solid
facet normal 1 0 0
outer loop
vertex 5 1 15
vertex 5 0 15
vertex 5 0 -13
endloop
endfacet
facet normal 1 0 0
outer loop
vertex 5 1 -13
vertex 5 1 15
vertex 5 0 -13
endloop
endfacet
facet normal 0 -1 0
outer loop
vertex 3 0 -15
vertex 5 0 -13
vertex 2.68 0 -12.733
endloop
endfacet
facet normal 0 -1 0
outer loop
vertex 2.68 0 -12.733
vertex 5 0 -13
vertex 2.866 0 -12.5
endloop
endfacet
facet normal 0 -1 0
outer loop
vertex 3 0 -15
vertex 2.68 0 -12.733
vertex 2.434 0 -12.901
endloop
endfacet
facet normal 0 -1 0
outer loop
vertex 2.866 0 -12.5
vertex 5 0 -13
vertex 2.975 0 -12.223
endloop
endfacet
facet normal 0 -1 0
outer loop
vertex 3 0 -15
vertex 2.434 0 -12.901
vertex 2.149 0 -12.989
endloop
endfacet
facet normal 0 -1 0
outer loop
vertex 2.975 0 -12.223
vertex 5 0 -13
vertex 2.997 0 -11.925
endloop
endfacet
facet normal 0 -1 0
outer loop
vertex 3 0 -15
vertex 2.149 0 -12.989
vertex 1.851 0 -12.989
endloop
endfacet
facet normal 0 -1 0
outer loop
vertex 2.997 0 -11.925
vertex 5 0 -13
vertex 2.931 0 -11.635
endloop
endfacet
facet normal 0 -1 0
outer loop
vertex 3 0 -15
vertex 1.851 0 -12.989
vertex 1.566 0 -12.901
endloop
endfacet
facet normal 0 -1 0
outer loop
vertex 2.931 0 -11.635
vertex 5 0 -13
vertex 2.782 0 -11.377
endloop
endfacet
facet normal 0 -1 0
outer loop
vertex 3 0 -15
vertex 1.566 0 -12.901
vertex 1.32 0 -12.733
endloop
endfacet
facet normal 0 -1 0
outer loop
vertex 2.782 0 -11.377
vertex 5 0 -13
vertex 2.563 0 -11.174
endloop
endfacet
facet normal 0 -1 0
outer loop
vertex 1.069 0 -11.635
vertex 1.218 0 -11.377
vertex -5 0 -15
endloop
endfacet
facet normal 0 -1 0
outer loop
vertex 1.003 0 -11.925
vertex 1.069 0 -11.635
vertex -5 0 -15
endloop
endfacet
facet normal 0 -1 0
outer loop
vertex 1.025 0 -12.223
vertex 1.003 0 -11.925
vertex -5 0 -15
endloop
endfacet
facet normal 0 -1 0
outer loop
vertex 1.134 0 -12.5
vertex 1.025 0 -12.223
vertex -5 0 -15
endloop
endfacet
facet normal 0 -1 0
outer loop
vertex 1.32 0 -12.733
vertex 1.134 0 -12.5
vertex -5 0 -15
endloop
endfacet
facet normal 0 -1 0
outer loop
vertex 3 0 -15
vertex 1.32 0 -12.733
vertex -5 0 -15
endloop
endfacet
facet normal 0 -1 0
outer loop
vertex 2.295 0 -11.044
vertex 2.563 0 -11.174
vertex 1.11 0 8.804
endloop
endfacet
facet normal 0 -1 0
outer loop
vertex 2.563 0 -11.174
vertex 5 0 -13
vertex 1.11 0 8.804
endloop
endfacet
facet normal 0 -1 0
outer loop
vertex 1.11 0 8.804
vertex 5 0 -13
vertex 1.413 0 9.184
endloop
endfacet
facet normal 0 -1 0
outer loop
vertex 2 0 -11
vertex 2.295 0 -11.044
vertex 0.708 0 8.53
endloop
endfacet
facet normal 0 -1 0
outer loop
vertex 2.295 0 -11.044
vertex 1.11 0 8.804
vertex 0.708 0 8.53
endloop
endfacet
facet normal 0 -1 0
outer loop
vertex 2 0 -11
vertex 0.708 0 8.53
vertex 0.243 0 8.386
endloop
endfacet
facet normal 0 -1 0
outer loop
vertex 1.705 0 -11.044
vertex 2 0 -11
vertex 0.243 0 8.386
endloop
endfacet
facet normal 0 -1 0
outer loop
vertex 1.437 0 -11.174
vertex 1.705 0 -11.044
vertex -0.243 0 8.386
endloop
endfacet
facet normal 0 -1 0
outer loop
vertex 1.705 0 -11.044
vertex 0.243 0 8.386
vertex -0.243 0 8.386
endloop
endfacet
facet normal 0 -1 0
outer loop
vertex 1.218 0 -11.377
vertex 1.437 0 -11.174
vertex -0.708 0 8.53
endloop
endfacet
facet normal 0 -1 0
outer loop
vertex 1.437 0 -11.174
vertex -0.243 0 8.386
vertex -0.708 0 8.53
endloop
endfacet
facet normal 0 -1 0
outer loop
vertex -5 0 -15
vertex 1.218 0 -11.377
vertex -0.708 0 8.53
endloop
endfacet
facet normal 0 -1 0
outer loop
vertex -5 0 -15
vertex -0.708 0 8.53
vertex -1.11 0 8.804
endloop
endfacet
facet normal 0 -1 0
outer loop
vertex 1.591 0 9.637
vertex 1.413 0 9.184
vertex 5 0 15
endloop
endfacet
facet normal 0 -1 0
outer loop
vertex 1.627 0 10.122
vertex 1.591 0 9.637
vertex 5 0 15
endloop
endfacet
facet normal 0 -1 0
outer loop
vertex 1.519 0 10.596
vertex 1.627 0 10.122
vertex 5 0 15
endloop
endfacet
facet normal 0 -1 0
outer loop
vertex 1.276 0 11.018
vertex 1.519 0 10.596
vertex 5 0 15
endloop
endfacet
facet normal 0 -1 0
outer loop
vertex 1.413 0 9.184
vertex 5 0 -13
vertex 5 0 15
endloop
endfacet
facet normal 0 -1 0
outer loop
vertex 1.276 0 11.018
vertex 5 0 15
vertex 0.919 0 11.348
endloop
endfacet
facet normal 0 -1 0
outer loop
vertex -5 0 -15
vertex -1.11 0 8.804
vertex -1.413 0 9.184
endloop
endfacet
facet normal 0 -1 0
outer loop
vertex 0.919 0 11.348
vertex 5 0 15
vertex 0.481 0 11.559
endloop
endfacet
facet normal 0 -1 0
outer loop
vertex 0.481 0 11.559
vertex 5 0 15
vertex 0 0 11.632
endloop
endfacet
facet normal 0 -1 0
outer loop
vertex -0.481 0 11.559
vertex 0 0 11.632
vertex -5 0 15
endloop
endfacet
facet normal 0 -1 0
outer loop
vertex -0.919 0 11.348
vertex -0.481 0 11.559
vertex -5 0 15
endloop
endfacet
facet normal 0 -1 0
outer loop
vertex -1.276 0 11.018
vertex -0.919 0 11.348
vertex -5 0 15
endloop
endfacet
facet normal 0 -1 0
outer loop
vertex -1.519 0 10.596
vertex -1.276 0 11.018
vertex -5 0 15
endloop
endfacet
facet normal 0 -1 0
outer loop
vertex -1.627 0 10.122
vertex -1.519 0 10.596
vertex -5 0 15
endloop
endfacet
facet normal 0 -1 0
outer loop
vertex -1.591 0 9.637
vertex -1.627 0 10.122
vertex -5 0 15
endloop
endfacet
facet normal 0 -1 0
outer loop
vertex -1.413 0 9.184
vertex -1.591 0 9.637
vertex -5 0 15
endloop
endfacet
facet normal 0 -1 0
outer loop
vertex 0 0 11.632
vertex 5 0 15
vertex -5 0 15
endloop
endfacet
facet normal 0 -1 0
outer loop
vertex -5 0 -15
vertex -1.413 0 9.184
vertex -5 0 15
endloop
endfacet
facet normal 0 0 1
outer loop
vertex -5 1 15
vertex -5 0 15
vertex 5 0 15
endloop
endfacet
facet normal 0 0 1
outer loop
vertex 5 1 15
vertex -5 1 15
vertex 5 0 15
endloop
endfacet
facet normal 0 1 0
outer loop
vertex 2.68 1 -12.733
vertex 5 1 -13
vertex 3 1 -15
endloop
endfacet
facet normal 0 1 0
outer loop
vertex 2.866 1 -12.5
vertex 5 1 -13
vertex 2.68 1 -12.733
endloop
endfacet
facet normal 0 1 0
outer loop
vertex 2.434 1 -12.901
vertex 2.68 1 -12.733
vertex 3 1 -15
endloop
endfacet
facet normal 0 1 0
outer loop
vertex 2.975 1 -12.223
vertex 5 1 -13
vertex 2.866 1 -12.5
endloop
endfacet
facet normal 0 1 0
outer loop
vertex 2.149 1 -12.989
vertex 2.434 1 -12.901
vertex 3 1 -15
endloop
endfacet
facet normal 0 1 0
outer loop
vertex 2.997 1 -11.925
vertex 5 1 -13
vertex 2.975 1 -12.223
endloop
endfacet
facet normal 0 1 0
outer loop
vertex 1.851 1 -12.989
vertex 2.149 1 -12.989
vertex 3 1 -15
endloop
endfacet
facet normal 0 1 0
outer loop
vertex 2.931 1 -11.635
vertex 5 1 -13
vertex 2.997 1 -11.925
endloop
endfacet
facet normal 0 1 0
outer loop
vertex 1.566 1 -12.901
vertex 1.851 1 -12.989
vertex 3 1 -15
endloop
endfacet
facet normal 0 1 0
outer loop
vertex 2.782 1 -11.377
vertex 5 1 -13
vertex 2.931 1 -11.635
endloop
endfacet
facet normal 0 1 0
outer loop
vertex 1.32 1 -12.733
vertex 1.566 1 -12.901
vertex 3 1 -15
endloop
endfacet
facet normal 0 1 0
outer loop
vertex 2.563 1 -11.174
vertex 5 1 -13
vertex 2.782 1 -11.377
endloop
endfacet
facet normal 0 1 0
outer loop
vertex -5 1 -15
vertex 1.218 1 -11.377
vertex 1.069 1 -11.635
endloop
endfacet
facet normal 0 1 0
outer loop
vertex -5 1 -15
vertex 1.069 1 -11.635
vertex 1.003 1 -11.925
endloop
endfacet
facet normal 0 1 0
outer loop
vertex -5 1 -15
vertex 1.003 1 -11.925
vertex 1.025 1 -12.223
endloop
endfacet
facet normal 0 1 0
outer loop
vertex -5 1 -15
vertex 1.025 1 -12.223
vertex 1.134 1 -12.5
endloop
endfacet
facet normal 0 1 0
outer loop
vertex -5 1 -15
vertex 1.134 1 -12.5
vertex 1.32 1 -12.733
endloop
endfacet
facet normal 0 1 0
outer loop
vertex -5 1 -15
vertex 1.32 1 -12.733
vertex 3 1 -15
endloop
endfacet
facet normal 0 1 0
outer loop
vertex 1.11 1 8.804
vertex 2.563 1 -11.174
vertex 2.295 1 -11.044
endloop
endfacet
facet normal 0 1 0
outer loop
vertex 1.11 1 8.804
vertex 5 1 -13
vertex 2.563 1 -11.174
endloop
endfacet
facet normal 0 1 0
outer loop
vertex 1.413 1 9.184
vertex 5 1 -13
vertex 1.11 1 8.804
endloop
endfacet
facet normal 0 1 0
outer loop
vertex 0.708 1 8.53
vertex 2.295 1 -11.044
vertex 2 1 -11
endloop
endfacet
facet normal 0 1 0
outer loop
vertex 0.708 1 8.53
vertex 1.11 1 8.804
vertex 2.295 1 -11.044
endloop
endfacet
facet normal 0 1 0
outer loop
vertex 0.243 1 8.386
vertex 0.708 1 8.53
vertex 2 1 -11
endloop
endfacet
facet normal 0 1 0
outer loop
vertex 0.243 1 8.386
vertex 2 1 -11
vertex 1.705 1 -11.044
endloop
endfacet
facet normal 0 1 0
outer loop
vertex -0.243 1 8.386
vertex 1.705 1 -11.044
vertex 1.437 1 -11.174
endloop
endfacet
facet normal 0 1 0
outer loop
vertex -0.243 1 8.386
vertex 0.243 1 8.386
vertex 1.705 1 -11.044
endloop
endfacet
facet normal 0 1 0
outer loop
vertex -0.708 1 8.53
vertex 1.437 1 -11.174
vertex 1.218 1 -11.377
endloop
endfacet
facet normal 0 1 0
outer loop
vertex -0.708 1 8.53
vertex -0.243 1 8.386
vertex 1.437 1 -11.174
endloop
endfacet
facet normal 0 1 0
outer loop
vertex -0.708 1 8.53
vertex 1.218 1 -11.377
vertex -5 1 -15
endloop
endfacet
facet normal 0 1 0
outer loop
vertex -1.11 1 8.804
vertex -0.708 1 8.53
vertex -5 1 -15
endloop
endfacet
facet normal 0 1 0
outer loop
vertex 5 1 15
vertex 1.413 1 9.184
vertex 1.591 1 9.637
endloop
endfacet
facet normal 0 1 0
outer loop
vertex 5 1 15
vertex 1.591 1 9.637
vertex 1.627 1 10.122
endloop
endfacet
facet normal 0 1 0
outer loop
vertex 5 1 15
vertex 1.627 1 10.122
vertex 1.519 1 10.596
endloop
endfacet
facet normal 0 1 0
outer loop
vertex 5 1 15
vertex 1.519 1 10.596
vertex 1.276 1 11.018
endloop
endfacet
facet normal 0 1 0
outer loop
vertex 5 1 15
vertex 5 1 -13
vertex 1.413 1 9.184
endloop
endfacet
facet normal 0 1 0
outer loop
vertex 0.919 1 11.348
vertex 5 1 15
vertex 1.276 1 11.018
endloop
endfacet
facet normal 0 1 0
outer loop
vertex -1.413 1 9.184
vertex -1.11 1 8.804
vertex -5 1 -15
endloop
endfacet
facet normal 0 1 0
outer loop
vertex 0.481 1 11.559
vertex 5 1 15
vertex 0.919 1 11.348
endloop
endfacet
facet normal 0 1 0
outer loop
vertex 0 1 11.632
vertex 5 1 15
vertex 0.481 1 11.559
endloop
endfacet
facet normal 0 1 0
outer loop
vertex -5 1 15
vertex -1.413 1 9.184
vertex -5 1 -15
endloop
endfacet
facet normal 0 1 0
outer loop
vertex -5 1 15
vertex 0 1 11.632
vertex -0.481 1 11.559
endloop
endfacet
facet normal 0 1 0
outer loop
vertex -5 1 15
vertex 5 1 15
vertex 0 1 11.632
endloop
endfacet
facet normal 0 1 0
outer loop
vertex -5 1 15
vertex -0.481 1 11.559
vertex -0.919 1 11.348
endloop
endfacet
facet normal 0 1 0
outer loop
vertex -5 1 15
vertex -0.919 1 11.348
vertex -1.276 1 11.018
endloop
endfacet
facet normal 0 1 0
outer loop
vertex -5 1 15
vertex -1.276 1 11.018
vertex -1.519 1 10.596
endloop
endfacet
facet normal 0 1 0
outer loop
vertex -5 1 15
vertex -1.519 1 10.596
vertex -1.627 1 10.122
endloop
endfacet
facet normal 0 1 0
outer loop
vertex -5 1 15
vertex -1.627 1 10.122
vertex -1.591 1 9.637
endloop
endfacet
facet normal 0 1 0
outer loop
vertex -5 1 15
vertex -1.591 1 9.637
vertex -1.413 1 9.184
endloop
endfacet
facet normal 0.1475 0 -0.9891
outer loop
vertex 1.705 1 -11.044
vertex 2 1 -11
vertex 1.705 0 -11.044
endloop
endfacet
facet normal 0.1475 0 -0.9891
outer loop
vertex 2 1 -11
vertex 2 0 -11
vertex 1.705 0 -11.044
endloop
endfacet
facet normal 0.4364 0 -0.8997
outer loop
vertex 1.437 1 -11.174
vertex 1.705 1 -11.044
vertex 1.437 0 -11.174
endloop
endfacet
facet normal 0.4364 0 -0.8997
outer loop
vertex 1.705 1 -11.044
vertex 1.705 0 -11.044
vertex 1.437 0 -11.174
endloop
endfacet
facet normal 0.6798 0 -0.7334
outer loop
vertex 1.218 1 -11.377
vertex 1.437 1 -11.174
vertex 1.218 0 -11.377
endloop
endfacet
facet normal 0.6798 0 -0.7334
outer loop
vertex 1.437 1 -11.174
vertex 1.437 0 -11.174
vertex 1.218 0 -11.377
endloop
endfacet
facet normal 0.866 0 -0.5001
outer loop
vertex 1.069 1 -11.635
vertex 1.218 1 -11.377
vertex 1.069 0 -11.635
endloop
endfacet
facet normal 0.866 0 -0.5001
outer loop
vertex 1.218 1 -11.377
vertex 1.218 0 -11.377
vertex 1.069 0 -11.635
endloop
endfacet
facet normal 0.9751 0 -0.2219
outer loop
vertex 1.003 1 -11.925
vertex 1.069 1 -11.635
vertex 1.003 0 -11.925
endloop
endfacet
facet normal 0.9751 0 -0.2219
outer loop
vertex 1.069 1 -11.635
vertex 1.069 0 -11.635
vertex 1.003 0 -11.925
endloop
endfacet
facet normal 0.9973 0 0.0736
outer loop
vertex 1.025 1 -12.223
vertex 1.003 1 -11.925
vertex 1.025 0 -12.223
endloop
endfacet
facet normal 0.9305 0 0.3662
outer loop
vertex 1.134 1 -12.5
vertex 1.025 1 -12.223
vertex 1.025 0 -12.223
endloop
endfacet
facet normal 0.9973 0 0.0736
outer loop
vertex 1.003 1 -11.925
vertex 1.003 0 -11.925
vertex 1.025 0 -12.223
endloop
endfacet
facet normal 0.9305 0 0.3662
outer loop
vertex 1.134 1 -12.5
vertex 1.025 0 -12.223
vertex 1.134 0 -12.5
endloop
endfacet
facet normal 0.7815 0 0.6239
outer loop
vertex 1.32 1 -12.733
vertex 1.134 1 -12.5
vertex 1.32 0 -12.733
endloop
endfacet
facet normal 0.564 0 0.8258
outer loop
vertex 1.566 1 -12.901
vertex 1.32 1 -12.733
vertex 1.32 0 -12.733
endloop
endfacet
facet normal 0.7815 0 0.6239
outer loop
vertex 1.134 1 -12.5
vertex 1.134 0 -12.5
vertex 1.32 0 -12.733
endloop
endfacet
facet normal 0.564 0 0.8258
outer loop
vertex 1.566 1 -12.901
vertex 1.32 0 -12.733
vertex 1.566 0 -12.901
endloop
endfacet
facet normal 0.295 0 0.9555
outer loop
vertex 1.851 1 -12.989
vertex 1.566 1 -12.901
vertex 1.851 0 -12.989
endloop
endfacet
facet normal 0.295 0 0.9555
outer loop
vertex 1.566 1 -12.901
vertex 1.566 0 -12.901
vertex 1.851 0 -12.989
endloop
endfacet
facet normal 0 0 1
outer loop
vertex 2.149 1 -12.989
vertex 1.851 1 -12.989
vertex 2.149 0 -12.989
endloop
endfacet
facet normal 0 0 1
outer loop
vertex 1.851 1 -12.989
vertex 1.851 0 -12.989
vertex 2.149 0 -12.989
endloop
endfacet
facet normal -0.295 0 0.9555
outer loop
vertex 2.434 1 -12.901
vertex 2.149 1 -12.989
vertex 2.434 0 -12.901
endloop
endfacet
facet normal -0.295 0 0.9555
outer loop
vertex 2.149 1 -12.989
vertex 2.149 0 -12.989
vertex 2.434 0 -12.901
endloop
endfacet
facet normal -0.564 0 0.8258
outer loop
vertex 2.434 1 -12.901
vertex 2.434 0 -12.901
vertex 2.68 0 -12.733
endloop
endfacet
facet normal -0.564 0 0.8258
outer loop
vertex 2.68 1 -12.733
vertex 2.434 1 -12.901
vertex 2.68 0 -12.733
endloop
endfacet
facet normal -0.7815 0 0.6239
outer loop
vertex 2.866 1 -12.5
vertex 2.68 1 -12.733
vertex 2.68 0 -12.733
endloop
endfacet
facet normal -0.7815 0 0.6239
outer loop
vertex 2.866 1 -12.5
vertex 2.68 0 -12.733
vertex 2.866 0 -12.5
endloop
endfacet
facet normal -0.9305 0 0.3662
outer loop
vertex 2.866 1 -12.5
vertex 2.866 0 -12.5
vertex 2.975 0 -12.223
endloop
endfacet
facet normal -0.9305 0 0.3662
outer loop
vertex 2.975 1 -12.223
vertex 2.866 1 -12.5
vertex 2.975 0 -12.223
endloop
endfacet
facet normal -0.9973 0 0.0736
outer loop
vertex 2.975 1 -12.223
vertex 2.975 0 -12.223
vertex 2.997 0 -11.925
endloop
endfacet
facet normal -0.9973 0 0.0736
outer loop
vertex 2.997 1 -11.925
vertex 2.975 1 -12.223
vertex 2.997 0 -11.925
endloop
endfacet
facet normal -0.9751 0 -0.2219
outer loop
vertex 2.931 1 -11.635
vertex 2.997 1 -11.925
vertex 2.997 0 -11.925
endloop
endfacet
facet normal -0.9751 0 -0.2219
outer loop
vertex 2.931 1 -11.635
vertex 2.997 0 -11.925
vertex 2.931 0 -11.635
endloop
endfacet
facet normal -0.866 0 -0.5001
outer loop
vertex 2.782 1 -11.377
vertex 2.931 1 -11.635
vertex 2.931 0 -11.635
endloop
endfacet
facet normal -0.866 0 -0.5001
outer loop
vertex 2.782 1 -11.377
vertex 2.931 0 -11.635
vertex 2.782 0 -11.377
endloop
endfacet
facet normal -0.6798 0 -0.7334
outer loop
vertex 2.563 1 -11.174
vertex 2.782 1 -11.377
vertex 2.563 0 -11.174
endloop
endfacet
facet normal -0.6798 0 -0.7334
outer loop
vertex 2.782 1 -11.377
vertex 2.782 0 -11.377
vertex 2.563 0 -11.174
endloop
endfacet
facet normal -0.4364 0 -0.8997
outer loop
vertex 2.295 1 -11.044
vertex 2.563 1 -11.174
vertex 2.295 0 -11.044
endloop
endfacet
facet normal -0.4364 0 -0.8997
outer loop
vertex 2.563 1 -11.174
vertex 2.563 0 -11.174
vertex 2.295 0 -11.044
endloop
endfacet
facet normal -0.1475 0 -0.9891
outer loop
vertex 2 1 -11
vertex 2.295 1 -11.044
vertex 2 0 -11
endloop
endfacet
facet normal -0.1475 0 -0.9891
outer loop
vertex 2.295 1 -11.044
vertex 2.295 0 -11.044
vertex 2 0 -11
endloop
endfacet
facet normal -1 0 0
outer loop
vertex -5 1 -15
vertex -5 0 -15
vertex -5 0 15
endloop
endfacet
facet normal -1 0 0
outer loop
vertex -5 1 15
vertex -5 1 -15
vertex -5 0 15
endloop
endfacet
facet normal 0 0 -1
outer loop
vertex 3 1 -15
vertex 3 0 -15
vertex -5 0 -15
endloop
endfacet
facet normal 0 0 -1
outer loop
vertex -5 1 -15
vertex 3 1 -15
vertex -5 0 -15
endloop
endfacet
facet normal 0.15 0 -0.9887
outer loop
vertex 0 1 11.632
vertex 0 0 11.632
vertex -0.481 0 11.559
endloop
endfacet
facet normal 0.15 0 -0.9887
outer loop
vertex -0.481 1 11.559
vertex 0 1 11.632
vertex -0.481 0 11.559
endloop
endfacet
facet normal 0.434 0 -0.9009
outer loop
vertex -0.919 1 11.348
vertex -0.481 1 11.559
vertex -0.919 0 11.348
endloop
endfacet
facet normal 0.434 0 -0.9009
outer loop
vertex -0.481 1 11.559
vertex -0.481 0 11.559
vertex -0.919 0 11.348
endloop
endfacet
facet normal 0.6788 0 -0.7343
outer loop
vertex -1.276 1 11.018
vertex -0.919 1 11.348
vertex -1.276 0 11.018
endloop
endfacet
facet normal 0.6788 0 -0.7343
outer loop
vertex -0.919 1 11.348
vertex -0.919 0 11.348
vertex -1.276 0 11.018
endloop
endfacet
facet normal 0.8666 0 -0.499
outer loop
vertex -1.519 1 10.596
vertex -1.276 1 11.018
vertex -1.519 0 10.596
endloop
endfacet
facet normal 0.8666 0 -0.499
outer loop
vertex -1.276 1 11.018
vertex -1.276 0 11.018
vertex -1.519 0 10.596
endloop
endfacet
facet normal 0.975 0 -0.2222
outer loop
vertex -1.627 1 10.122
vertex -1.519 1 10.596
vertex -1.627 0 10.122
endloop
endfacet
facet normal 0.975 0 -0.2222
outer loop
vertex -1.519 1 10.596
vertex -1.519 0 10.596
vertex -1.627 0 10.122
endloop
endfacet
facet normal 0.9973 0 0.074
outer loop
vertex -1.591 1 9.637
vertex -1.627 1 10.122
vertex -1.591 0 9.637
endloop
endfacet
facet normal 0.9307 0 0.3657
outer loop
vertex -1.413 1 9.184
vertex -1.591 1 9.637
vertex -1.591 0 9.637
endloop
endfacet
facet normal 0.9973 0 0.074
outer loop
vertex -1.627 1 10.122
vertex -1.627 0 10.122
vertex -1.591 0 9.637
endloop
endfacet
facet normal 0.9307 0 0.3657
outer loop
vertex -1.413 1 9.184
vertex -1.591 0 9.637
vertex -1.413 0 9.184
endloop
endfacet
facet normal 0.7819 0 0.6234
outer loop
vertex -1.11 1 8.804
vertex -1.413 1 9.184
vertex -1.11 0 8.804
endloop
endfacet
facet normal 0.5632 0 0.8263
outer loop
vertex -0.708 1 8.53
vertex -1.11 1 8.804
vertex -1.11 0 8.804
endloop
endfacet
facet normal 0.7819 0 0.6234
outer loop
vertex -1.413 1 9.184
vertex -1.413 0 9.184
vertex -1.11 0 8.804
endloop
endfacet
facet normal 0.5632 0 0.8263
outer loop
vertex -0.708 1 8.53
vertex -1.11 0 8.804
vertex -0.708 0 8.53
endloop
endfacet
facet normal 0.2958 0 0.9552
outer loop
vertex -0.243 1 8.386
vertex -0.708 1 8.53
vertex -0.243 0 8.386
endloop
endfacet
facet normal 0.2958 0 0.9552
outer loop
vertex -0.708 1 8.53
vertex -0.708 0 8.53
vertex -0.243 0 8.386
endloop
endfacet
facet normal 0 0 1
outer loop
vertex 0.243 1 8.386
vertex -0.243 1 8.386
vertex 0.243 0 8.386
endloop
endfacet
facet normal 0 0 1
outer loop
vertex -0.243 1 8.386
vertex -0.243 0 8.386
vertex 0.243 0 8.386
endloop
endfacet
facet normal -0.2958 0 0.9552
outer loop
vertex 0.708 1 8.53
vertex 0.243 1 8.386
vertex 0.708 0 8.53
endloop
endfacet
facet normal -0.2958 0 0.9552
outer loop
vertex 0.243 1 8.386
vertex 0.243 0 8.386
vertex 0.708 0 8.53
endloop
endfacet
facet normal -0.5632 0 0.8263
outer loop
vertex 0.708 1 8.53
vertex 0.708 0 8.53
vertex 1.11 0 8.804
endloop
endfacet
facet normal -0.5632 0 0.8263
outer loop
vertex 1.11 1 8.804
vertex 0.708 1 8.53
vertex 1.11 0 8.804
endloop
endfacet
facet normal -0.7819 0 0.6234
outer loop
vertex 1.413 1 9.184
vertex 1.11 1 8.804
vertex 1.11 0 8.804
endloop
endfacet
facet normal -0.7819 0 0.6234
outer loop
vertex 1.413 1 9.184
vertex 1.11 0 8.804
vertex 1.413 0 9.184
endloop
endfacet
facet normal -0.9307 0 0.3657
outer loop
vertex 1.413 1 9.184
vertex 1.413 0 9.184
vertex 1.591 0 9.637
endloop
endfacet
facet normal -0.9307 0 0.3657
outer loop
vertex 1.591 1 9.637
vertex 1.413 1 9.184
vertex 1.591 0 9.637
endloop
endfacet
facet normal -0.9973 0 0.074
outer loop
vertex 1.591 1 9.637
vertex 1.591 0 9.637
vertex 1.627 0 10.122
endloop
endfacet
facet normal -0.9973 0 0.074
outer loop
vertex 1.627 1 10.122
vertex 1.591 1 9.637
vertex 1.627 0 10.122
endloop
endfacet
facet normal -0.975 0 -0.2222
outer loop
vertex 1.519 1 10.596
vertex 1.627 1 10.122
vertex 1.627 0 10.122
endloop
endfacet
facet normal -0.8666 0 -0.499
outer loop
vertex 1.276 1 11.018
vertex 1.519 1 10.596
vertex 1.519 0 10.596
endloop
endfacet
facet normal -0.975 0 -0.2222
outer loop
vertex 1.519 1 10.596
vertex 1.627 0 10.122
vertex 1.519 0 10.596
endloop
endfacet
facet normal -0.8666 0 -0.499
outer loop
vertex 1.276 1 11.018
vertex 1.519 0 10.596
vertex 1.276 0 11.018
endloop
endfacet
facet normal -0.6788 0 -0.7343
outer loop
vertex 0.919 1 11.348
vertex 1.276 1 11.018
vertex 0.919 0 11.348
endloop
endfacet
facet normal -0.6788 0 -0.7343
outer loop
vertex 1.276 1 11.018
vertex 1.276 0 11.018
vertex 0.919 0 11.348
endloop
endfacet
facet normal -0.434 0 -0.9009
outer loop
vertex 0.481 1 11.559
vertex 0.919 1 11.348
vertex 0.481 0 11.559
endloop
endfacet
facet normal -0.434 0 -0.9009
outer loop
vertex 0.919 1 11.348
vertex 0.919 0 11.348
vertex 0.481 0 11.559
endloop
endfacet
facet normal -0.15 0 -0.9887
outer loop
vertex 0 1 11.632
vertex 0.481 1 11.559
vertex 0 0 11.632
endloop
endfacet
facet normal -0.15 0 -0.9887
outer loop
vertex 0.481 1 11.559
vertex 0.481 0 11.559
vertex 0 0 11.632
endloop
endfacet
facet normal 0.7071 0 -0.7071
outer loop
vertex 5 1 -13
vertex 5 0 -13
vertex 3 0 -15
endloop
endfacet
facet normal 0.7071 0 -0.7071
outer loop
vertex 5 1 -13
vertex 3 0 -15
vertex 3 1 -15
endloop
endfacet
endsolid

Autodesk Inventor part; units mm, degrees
ref_plane "YZ Plane" through (0, 0, 0) normal (1, 0, 0) x (0, 1, 0)
ref_plane "XZ Plane" through (0, 0, 0) normal (0, 1, 0) x (-1, 0, 0)
ref_plane "XY Plane" through (0, 0, 0) normal (0, 0, 1) x (1, 0, 0)
sketch "Sketch1" plane through (0, 0, 0) normal (0, 1, 0) x (-1, 0, 0)
  line L0 (5, 15) -> (-5, 15)
  line L1 (-5, 15) -> (-5, -15)
  line L2 (-5, -15) -> (5, -15)
  line L3 (5, -15) -> (5, 15)
  point P0 (0, 0)
  point P1 (5, 0)
  point P2 (0, -15)
  dimension "d0" = 30
  dimension "d1" = 10
extrude "Extrusion1" add sketch "Sketch1" along normal blind 1
sketch "Sketch2" plane through (0, 1, 0) normal (0, 1, 0) x (1, 0, 0)
  line L0 (-5, -15) -> (5, -15) projected
  point P0 (0, 0)
  point P1 (0, -10)
  dimension "d4" = 5
hole "Hole1" at (0, 1, 10) direction (0, -1, 0) diameter 3.264 depth 4 clearance for "Flat Head Machine Screw (82)" size "#4" standard "Ansi Unified Screw Threads"
chamfer "Chamfer1" distance 2 angle 45 1 edges at (5, 0.5, -15)
sketch "Sketch3" plane through (0, 1, 0) normal (0, 1, 0) x (1, 0, 0)
  line L0 (5, -15) -> (5, 13) projected
  line L1 (3, 15) -> (-5, 15) projected
  point P0 (0, 0)
  point P1 (2, 12)
  dimension "d15" = 3
  dimension "d16" = 3
hole "Hole2" at (2, 1, -12) direction (0, -1, 0) diameter 2 end through all
properties part number "spring cover" material "Aluminum 6061"
